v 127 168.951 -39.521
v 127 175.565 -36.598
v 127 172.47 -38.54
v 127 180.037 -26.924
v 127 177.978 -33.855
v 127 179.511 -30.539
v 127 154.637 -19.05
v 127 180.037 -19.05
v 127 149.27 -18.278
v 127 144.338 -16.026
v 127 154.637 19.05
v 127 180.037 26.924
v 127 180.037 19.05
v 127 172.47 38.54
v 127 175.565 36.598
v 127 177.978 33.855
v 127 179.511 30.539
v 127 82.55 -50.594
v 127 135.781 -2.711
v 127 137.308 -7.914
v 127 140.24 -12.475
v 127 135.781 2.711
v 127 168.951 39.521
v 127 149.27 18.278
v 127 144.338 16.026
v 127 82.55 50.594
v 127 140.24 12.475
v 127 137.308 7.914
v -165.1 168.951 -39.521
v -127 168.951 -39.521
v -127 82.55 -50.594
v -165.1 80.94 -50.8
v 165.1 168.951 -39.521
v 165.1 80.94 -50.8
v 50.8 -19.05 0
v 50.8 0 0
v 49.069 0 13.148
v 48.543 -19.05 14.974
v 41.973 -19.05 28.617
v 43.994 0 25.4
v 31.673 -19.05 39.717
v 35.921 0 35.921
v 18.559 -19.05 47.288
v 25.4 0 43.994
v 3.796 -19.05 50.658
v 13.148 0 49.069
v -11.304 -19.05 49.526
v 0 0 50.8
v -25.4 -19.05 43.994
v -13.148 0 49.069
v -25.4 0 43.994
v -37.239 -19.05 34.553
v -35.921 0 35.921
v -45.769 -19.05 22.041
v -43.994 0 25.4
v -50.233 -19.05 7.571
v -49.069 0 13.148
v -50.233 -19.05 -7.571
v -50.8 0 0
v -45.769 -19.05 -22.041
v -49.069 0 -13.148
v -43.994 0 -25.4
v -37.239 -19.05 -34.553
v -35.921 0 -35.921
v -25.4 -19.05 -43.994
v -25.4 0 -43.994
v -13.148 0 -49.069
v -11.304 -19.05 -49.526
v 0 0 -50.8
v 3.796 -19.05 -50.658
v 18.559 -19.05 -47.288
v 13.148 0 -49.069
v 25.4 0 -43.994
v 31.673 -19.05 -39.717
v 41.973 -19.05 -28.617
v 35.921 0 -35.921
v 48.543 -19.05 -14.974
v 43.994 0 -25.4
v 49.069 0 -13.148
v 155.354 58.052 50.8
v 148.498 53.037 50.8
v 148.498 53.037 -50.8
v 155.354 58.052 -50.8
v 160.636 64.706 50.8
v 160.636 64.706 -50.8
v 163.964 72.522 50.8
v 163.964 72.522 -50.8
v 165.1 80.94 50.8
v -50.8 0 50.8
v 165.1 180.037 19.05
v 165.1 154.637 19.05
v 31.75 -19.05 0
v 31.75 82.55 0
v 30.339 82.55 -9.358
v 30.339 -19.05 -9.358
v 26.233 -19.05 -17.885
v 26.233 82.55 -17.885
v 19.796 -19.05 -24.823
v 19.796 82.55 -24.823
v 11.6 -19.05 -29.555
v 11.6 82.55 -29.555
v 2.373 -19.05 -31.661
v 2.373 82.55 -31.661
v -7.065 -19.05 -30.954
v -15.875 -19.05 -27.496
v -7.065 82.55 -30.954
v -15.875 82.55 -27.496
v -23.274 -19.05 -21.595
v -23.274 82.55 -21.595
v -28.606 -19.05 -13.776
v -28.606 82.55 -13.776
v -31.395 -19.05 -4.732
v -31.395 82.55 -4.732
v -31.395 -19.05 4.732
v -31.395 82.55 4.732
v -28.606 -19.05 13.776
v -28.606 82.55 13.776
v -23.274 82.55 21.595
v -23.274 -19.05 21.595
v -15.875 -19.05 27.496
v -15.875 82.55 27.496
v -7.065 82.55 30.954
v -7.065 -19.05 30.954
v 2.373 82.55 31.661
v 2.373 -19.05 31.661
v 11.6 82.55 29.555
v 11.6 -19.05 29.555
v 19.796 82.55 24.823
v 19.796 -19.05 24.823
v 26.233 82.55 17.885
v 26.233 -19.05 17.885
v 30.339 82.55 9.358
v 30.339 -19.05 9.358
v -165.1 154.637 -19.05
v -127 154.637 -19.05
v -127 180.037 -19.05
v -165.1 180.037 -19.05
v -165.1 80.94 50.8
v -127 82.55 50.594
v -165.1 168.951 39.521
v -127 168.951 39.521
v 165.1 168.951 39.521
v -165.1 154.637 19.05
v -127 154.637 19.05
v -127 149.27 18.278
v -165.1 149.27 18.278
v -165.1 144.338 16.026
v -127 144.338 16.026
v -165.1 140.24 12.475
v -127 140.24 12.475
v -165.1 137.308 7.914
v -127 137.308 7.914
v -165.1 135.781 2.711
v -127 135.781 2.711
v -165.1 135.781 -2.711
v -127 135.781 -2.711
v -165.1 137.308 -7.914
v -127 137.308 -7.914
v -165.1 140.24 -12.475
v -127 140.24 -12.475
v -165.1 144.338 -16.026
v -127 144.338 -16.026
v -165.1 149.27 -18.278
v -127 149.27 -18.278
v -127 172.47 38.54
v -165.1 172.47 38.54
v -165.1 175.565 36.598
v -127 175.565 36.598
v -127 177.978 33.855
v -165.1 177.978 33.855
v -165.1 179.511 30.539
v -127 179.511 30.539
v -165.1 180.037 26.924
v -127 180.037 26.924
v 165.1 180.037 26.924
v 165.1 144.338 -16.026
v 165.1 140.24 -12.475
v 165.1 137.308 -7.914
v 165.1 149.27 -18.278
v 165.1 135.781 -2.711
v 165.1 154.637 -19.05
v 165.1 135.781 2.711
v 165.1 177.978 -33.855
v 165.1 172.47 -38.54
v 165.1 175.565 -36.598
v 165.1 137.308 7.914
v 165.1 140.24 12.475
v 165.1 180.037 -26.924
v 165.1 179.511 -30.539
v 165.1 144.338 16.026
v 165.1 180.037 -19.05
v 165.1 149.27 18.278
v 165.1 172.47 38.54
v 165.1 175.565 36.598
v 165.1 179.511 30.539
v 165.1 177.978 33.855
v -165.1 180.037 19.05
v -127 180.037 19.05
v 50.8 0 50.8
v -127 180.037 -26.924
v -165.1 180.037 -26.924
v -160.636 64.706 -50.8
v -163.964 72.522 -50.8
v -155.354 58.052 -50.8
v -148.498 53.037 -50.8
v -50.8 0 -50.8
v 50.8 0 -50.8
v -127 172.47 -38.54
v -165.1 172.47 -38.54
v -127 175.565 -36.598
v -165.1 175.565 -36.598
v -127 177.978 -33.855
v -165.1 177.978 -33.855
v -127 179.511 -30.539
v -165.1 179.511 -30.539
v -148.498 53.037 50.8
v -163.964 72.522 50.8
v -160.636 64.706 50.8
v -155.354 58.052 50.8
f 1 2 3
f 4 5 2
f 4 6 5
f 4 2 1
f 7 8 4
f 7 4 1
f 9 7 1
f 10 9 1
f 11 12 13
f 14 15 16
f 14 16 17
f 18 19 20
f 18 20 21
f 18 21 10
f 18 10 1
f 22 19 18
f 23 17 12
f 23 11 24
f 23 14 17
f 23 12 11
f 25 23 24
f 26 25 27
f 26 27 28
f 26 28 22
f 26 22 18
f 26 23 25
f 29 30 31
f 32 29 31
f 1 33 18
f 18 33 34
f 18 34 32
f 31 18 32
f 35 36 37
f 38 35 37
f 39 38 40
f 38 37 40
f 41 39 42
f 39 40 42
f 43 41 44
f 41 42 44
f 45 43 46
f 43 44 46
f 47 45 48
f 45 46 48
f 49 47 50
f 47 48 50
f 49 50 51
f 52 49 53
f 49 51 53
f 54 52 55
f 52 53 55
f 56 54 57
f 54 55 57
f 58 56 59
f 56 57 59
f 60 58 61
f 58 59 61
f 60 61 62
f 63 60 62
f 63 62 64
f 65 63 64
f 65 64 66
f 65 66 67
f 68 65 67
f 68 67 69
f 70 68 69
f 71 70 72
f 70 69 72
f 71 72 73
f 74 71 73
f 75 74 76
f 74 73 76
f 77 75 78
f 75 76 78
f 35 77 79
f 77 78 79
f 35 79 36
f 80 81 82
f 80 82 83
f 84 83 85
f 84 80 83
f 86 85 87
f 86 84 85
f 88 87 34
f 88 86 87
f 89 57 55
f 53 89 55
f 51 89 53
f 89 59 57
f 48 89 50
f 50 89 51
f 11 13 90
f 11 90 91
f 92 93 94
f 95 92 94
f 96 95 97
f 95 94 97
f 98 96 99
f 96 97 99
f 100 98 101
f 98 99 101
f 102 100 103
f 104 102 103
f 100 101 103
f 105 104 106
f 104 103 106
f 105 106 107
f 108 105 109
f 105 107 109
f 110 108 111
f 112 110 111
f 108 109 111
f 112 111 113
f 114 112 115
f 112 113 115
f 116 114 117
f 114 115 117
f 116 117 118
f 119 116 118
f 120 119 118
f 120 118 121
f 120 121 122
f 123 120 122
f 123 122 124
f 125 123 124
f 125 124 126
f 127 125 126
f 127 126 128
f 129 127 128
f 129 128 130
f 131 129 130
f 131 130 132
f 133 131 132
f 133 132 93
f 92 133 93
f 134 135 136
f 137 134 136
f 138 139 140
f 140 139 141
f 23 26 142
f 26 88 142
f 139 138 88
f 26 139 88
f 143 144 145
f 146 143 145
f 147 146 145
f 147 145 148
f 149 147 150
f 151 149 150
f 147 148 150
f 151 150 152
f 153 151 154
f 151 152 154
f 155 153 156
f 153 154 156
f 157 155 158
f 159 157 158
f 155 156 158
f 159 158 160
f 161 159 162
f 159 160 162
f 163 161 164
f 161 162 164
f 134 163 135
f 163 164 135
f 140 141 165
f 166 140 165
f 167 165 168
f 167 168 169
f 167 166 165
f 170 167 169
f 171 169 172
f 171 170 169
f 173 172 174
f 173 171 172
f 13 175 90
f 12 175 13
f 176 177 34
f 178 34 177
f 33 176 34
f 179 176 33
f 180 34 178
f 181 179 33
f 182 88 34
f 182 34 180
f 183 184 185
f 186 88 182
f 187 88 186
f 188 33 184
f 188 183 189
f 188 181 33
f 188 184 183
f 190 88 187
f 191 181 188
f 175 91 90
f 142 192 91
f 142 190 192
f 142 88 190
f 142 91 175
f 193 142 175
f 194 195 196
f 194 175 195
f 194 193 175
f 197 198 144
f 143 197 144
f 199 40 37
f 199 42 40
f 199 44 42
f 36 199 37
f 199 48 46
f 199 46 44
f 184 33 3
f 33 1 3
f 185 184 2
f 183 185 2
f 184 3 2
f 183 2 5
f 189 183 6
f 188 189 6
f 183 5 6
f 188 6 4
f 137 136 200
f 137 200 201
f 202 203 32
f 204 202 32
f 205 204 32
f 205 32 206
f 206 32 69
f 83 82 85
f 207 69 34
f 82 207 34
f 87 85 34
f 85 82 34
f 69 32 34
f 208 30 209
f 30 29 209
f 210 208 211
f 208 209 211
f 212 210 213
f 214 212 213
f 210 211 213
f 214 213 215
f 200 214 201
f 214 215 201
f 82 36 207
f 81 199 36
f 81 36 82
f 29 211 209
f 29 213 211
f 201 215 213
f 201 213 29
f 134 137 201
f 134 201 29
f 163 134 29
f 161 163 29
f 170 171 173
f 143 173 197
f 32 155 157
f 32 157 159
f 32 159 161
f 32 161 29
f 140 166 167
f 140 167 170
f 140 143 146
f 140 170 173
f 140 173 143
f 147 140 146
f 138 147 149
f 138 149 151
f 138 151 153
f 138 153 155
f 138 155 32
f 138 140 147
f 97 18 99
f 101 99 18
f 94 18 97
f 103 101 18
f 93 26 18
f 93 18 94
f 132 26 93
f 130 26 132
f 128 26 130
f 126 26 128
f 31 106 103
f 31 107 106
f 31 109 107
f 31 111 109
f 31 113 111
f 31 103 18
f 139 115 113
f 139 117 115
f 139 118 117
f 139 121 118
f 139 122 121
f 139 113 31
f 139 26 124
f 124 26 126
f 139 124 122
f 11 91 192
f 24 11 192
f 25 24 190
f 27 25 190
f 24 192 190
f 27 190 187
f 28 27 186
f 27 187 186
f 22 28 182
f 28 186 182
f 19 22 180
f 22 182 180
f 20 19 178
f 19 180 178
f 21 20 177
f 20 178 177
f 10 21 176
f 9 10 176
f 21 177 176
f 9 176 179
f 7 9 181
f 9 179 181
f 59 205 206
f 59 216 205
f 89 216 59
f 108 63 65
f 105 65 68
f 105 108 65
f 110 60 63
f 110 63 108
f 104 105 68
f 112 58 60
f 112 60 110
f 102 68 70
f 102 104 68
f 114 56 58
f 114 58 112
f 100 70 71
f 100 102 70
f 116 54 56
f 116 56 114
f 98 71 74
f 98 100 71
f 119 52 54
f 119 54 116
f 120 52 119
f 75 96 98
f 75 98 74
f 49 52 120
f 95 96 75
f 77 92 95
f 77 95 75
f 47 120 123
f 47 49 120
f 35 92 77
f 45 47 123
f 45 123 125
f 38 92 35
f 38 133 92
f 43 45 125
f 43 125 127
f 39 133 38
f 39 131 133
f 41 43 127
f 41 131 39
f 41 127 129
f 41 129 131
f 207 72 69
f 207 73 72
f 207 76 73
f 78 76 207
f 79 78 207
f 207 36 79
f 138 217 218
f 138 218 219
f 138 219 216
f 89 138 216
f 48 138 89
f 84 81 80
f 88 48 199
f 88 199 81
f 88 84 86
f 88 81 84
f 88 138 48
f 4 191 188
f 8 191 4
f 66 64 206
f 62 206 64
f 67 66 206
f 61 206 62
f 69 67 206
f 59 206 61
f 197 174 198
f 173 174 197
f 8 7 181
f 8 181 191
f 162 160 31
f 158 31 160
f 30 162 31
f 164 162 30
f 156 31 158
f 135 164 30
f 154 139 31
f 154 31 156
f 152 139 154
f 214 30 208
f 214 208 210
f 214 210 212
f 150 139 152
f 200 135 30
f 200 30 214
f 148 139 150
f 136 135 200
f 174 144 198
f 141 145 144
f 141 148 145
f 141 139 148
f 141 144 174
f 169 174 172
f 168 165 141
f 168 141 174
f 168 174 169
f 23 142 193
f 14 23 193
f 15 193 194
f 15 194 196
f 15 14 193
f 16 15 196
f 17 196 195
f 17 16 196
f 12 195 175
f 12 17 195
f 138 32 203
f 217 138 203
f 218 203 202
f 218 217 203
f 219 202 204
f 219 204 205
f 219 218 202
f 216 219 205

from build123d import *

# Parameters (mm, degrees)
BOSS_EXTRUDE1_DEPTH = 50.8
SKETCH2_R           = 50.8
BOSS_EXTRUDE2_DEPTH = 19.05
SKETCH3_R           = 31.75
CUT_EXTRUDE1_DEPTH  = 102.6
CUT_EXTRUDE2_DEPTH  = 331.2
FILLET1_R           = 12.7


with BuildPart() as part:
    # Sketch1 → Boss-Extrude1 (new body, symmetric)
    with BuildSketch(Plane.XY):
        with BuildLine():
            Line((-50.8, 0), (50.8, 0))
            Line((50.8, 0), (148.497855998, 53.036837313))
            ThreePointArc((148.497855998, 53.036837313), (160.635590775, 64.705829567), (165.1, 80.940330977))
            Line((165.1, 80.940330977), (165.1, 180.036837313))
            Line((165.1, 180.036837313), (127, 180.036837313))
            Line((127, 180.036837313), (127, 82.55))
            Line((127, 82.55), (-127, 82.55))
            Line((-127, 82.55), (-127, 180.036837313))
            Line((-127, 180.036837313), (-165.1, 180.036837313))
            Line((-165.1, 180.036837313), (-165.1, 80.940330977))
            ThreePointArc((-165.1, 80.940330977), (-160.635590775, 64.705829567), (-148.497855998, 53.036837313))
            Line((-148.497855998, 53.036837313), (-50.8, 0))
        make_face()
    extrude(amount=BOSS_EXTRUDE1_DEPTH, both=True)

    # Sketch2 → Boss-Extrude2 (add)
    with BuildSketch(Plane.XZ):
        Circle(SKETCH2_R)
    extrude(amount=BOSS_EXTRUDE2_DEPTH)

    # Sketch3 → Cut-Extrude1 (cut, through all)
    with BuildSketch(Plane(origin=(0, 82.55, 0), x_dir=(1, 0, 0), z_dir=(0, 1, 0))):
        Circle(SKETCH3_R)
    extrude(amount=-CUT_EXTRUDE1_DEPTH, mode=Mode.SUBTRACT)

    # Sketch4 → Cut-Extrude2 (cut, through all)
    with BuildSketch(Plane(origin=(165.1, 0, 0), x_dir=(0, 0, -1), z_dir=(1, 0, 0))):
        Polygon((-50.8, 180.036837313), (-50.8, 80.940330977), (-38.1, 180.036837313), align=None)
        with BuildLine():
            Line((19.05, 180.036837313), (-19.05, 180.036837313))
            Line((-19.05, 180.036837313), (-19.05, 154.636837313))
            ThreePointArc((-19.05, 154.636837313), (0, 135.586837313), (19.05, 154.636837313))
            Line((19.05, 154.636837313), (19.05, 180.036837313))
        make_face()
        Polygon((38.1, 180.036837313), (50.8, 80.940330977), (50.8, 180.036837313), align=None)
    extrude(amount=-CUT_EXTRUDE2_DEPTH, mode=Mode.SUBTRACT)

    # Fillet1
    fillet1_edges = [part.edges().sort_by_distance(p)[0] for p in [
        (146.05, 180.036837313, -38.1),
        (-146.05, 180.036837313, -38.1),
        (146.05, 180.036837313, 38.1),
        (-146.05, 180.036837313, 38.1),
    ]]
    fillet(fillet1_edges, radius=FILLET1_R)


solid = part.part
